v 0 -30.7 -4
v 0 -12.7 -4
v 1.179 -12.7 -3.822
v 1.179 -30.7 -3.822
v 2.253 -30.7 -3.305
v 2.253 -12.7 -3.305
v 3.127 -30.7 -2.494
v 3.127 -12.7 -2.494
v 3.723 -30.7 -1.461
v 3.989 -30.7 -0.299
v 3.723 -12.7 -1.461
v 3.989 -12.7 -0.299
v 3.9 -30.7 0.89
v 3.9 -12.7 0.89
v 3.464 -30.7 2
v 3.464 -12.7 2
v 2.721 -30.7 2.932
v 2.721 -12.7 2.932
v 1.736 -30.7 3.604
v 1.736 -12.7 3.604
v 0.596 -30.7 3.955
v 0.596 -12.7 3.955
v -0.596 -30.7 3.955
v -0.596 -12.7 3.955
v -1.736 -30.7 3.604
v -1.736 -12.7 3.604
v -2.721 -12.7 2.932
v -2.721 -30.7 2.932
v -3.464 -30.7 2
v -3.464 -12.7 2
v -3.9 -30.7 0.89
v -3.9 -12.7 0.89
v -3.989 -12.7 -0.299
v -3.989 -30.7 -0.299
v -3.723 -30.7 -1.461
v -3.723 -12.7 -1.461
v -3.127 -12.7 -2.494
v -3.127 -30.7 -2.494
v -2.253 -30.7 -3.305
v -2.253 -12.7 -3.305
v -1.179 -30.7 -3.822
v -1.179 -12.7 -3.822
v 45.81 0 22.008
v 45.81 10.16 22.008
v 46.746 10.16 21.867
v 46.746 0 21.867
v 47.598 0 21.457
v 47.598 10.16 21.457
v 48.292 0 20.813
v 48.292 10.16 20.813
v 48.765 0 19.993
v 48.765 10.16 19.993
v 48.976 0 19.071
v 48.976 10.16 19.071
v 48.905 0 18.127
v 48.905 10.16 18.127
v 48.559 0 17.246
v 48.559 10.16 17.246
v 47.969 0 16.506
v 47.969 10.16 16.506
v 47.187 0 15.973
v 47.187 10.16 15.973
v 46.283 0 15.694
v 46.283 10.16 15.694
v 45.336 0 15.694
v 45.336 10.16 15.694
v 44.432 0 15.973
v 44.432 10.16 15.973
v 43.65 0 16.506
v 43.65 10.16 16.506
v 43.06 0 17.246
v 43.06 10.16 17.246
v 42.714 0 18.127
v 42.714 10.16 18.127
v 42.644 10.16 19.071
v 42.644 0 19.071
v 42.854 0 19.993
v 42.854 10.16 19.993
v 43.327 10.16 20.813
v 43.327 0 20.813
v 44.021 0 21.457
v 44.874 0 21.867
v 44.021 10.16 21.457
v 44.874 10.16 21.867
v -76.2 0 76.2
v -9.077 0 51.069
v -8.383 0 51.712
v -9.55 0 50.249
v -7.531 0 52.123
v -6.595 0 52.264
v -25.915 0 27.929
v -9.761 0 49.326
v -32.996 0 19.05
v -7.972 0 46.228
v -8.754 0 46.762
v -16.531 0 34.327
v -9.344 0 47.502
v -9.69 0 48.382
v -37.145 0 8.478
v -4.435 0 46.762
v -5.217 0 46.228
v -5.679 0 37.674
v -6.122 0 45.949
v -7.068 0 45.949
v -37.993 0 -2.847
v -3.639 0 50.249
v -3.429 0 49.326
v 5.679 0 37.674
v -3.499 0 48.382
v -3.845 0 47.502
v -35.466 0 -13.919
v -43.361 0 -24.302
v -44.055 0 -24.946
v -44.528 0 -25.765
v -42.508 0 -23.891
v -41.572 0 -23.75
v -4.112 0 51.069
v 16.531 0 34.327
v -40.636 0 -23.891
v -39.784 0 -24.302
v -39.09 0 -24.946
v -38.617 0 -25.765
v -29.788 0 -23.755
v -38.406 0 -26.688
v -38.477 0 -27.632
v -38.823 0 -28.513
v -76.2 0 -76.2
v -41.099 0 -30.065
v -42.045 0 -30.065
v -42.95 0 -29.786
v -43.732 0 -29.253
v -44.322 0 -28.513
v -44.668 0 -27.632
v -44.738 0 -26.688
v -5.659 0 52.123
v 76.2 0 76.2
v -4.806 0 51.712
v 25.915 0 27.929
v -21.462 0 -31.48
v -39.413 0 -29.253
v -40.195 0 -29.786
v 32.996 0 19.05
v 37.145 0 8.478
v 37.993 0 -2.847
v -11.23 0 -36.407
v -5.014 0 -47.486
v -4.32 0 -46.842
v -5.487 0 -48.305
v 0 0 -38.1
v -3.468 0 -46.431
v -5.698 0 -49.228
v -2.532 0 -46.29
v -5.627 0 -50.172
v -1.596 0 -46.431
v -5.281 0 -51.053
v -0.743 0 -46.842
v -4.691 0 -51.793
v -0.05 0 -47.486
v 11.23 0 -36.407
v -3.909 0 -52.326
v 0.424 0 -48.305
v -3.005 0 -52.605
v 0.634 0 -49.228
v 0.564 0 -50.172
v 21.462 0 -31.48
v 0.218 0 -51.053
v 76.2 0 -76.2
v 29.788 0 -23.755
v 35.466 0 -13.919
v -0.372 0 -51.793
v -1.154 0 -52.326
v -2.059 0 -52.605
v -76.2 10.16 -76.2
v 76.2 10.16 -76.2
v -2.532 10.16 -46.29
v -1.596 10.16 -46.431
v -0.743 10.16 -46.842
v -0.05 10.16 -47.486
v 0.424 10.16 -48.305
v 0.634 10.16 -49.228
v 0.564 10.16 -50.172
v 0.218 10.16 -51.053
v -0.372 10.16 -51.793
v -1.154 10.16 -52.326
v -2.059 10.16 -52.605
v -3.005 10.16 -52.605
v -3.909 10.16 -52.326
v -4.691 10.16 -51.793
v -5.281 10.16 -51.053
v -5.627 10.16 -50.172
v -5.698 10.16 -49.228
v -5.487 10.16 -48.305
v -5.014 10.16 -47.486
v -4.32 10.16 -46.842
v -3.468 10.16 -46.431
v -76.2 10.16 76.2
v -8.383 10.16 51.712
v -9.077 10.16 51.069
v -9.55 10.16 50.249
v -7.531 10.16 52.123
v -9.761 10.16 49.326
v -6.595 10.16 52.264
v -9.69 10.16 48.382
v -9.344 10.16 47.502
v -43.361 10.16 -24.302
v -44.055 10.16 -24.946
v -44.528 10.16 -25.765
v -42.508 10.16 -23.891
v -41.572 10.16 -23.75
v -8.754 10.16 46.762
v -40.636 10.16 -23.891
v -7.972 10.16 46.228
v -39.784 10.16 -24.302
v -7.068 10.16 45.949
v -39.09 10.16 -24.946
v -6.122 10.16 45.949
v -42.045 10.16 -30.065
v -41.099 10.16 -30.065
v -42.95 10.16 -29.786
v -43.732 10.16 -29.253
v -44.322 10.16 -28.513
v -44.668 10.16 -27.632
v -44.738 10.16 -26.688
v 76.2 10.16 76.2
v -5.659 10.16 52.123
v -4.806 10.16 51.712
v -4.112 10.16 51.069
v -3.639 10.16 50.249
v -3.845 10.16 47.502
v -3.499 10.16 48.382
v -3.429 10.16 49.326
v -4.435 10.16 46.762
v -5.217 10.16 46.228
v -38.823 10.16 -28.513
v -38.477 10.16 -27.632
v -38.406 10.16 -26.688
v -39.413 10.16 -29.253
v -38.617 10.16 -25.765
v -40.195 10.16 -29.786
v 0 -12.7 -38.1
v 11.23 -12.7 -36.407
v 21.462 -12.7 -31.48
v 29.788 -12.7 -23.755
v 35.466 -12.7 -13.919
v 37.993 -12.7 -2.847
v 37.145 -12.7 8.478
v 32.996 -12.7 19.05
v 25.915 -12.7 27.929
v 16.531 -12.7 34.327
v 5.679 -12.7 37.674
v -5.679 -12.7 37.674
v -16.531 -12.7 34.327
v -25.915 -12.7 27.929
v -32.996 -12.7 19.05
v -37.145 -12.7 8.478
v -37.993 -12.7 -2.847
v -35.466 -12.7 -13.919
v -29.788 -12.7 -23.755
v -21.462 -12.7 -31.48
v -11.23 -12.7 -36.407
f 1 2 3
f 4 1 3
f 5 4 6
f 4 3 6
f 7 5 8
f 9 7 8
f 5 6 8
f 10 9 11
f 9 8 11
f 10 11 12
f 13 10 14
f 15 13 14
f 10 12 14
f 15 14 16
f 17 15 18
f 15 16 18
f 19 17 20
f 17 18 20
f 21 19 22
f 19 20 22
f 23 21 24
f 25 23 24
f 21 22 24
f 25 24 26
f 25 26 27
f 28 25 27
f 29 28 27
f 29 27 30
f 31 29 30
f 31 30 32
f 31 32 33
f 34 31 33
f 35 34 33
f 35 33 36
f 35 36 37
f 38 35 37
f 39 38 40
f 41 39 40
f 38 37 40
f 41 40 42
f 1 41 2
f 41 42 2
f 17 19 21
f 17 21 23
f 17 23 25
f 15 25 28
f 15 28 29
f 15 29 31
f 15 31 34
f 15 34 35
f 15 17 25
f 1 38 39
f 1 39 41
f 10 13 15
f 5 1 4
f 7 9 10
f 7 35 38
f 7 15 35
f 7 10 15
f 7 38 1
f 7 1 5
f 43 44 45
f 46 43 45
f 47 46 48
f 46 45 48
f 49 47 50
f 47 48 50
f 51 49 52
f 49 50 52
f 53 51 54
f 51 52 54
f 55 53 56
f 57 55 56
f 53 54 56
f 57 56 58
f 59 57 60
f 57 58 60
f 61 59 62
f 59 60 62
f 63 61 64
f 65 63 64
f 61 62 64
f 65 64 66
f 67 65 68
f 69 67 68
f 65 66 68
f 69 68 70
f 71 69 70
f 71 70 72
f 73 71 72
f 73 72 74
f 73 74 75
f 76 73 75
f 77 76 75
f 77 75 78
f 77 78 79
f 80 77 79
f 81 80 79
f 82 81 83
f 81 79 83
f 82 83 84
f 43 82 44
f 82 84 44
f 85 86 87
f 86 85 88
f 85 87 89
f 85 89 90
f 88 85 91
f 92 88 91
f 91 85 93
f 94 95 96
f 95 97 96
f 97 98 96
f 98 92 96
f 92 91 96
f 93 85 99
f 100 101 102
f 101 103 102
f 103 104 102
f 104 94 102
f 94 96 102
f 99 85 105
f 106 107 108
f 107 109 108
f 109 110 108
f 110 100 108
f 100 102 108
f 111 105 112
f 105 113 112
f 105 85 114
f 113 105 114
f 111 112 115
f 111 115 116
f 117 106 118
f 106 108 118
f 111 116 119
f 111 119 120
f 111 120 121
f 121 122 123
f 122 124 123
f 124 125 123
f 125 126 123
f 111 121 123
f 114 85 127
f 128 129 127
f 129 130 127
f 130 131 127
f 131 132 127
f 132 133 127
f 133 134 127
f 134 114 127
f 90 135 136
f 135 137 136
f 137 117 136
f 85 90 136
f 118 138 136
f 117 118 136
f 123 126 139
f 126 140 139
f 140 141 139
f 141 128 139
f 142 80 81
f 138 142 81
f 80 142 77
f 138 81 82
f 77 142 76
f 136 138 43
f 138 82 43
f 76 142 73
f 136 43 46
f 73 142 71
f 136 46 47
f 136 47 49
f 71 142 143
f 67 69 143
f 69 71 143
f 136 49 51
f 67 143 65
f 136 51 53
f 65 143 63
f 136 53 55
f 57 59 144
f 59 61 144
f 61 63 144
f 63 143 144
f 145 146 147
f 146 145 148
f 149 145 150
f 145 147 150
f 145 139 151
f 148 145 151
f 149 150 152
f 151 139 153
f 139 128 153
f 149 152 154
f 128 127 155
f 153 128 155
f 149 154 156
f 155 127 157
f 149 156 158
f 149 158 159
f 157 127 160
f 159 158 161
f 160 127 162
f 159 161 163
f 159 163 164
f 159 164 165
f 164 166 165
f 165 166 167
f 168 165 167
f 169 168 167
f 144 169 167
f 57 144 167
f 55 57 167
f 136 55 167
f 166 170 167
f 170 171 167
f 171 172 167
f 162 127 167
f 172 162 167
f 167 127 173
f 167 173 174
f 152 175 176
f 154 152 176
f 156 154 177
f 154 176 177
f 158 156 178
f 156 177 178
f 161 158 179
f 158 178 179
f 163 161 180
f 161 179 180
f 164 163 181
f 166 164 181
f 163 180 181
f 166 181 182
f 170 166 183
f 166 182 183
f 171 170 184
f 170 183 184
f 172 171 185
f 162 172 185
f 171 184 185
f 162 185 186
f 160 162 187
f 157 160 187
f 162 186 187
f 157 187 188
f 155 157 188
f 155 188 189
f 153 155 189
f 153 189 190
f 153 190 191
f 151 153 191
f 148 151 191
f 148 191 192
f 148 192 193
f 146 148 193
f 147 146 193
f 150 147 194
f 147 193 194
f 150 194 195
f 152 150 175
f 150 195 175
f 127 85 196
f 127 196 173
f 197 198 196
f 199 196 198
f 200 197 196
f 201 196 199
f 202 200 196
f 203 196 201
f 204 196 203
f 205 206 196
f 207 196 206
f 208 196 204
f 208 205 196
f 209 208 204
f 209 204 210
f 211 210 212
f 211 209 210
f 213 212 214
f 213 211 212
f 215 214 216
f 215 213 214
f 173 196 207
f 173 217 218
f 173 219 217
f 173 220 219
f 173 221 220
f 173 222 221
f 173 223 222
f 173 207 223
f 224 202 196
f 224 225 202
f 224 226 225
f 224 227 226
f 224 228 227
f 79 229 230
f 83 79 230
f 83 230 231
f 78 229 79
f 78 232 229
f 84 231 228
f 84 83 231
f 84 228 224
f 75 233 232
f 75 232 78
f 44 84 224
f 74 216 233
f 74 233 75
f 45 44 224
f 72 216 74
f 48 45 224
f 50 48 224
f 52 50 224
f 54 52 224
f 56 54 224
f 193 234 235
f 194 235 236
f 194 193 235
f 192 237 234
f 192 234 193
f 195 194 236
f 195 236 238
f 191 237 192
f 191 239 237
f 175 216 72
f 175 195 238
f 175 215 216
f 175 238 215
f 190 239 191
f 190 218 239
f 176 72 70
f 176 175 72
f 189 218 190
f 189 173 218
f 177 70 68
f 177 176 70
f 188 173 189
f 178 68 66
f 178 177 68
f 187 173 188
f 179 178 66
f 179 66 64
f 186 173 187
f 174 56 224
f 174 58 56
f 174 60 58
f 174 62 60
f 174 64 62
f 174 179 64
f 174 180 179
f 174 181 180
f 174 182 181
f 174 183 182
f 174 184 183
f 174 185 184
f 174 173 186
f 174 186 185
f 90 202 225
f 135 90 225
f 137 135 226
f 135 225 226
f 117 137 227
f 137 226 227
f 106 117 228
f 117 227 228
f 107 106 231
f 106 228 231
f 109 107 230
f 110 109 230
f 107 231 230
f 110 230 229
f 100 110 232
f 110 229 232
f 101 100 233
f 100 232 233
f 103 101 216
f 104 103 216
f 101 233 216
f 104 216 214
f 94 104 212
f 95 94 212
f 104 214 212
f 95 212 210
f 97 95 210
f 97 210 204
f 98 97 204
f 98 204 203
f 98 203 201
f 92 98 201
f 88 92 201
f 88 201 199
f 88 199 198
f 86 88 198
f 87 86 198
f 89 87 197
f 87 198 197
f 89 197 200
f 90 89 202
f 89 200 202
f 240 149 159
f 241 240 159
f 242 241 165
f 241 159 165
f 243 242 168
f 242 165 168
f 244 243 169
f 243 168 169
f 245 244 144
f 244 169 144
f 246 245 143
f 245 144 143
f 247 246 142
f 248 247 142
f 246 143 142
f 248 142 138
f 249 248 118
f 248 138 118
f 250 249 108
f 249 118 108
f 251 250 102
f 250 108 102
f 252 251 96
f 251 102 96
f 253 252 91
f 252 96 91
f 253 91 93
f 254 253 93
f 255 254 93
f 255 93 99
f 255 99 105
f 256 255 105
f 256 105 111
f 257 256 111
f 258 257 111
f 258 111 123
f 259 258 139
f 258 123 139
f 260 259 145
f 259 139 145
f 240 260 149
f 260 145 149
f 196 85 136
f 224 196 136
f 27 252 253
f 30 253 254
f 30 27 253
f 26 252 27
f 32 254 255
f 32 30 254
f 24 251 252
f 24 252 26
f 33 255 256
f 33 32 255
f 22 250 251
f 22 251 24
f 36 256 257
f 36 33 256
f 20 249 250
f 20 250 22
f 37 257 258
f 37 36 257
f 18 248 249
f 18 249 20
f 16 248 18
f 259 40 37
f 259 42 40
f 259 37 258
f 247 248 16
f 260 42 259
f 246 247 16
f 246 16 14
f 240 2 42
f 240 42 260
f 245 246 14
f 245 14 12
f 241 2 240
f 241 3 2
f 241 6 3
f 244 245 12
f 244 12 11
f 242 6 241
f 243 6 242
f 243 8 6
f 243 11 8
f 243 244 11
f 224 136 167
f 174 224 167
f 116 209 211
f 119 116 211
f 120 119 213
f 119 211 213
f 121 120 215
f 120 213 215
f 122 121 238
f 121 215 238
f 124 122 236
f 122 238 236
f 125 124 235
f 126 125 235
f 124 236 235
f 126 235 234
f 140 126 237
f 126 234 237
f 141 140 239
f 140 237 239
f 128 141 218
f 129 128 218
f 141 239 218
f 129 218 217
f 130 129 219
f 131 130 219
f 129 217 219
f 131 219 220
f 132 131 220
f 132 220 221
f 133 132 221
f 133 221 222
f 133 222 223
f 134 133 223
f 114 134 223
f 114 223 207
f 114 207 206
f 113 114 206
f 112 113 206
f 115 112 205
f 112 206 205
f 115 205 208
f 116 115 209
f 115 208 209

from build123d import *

# Parameters (mm, degrees)
SKETCH1_W           = 152.4
SKETCH1_H           = 152.4
BOSS_EXTRUDE1_DEPTH = 10.16
SKETCH3_R           = 38.1
BOSS_EXTRUDE3_DEPTH = 12.7
SKETCH4_R           = 4
BOSS_EXTRUDE4_DEPTH = 18
SKETCH7_R           = 3.175
CUT_EXTRUDE2_DEPTH  = 10.16


with BuildPart() as part:
    # Sketch1 → Boss-Extrude1 (new body)
    with BuildSketch(Plane(origin=(0, 0, 0), x_dir=(1, 0, 0), z_dir=(0, 1, 0))):
        Rectangle(SKETCH1_W, SKETCH1_H)
    extrude(amount=BOSS_EXTRUDE1_DEPTH)

    # Sketch3 → Boss-Extrude3 (add)
    with BuildSketch(Plane.XZ):
        with Locations(Location((0, 0, 0), (0, 0, 270))):
            Circle(SKETCH3_R)
    extrude(amount=BOSS_EXTRUDE3_DEPTH)

    # Sketch4 → Boss-Extrude4 (add)
    with BuildSketch(Plane.XZ.offset(12.7)):
        with Locations(Location((0, 0, 0), (0, 0, 270))):
            Circle(SKETCH4_R)
    extrude(amount=BOSS_EXTRUDE4_DEPTH)

    # Sketch7 → Cut-Extrude2 (cut)
    with BuildSketch(Plane(origin=(0, 10.16, 0), x_dir=(1, 0, 0), z_dir=(0, 1, 0))):
        with Locations(Location((-41.57222955, 26.925278647, 0), (0, 0, 270))):
            Circle(SKETCH7_R)
        with Locations(Location((-2.531860538, 49.465246206, 0), (0, 0, 270))):
            Circle(SKETCH7_R)
        with Locations(Location((-6.594762938, -49.089000823, 0), (0, 0, 270))):
            Circle(SKETCH7_R)
        with Locations(Location((45.809703228, -18.833268175, 0), (0, 0, 270))):
            Circle(SKETCH7_R)
    extrude(amount=-CUT_EXTRUDE2_DEPTH, mode=Mode.SUBTRACT)


solid = part.part
